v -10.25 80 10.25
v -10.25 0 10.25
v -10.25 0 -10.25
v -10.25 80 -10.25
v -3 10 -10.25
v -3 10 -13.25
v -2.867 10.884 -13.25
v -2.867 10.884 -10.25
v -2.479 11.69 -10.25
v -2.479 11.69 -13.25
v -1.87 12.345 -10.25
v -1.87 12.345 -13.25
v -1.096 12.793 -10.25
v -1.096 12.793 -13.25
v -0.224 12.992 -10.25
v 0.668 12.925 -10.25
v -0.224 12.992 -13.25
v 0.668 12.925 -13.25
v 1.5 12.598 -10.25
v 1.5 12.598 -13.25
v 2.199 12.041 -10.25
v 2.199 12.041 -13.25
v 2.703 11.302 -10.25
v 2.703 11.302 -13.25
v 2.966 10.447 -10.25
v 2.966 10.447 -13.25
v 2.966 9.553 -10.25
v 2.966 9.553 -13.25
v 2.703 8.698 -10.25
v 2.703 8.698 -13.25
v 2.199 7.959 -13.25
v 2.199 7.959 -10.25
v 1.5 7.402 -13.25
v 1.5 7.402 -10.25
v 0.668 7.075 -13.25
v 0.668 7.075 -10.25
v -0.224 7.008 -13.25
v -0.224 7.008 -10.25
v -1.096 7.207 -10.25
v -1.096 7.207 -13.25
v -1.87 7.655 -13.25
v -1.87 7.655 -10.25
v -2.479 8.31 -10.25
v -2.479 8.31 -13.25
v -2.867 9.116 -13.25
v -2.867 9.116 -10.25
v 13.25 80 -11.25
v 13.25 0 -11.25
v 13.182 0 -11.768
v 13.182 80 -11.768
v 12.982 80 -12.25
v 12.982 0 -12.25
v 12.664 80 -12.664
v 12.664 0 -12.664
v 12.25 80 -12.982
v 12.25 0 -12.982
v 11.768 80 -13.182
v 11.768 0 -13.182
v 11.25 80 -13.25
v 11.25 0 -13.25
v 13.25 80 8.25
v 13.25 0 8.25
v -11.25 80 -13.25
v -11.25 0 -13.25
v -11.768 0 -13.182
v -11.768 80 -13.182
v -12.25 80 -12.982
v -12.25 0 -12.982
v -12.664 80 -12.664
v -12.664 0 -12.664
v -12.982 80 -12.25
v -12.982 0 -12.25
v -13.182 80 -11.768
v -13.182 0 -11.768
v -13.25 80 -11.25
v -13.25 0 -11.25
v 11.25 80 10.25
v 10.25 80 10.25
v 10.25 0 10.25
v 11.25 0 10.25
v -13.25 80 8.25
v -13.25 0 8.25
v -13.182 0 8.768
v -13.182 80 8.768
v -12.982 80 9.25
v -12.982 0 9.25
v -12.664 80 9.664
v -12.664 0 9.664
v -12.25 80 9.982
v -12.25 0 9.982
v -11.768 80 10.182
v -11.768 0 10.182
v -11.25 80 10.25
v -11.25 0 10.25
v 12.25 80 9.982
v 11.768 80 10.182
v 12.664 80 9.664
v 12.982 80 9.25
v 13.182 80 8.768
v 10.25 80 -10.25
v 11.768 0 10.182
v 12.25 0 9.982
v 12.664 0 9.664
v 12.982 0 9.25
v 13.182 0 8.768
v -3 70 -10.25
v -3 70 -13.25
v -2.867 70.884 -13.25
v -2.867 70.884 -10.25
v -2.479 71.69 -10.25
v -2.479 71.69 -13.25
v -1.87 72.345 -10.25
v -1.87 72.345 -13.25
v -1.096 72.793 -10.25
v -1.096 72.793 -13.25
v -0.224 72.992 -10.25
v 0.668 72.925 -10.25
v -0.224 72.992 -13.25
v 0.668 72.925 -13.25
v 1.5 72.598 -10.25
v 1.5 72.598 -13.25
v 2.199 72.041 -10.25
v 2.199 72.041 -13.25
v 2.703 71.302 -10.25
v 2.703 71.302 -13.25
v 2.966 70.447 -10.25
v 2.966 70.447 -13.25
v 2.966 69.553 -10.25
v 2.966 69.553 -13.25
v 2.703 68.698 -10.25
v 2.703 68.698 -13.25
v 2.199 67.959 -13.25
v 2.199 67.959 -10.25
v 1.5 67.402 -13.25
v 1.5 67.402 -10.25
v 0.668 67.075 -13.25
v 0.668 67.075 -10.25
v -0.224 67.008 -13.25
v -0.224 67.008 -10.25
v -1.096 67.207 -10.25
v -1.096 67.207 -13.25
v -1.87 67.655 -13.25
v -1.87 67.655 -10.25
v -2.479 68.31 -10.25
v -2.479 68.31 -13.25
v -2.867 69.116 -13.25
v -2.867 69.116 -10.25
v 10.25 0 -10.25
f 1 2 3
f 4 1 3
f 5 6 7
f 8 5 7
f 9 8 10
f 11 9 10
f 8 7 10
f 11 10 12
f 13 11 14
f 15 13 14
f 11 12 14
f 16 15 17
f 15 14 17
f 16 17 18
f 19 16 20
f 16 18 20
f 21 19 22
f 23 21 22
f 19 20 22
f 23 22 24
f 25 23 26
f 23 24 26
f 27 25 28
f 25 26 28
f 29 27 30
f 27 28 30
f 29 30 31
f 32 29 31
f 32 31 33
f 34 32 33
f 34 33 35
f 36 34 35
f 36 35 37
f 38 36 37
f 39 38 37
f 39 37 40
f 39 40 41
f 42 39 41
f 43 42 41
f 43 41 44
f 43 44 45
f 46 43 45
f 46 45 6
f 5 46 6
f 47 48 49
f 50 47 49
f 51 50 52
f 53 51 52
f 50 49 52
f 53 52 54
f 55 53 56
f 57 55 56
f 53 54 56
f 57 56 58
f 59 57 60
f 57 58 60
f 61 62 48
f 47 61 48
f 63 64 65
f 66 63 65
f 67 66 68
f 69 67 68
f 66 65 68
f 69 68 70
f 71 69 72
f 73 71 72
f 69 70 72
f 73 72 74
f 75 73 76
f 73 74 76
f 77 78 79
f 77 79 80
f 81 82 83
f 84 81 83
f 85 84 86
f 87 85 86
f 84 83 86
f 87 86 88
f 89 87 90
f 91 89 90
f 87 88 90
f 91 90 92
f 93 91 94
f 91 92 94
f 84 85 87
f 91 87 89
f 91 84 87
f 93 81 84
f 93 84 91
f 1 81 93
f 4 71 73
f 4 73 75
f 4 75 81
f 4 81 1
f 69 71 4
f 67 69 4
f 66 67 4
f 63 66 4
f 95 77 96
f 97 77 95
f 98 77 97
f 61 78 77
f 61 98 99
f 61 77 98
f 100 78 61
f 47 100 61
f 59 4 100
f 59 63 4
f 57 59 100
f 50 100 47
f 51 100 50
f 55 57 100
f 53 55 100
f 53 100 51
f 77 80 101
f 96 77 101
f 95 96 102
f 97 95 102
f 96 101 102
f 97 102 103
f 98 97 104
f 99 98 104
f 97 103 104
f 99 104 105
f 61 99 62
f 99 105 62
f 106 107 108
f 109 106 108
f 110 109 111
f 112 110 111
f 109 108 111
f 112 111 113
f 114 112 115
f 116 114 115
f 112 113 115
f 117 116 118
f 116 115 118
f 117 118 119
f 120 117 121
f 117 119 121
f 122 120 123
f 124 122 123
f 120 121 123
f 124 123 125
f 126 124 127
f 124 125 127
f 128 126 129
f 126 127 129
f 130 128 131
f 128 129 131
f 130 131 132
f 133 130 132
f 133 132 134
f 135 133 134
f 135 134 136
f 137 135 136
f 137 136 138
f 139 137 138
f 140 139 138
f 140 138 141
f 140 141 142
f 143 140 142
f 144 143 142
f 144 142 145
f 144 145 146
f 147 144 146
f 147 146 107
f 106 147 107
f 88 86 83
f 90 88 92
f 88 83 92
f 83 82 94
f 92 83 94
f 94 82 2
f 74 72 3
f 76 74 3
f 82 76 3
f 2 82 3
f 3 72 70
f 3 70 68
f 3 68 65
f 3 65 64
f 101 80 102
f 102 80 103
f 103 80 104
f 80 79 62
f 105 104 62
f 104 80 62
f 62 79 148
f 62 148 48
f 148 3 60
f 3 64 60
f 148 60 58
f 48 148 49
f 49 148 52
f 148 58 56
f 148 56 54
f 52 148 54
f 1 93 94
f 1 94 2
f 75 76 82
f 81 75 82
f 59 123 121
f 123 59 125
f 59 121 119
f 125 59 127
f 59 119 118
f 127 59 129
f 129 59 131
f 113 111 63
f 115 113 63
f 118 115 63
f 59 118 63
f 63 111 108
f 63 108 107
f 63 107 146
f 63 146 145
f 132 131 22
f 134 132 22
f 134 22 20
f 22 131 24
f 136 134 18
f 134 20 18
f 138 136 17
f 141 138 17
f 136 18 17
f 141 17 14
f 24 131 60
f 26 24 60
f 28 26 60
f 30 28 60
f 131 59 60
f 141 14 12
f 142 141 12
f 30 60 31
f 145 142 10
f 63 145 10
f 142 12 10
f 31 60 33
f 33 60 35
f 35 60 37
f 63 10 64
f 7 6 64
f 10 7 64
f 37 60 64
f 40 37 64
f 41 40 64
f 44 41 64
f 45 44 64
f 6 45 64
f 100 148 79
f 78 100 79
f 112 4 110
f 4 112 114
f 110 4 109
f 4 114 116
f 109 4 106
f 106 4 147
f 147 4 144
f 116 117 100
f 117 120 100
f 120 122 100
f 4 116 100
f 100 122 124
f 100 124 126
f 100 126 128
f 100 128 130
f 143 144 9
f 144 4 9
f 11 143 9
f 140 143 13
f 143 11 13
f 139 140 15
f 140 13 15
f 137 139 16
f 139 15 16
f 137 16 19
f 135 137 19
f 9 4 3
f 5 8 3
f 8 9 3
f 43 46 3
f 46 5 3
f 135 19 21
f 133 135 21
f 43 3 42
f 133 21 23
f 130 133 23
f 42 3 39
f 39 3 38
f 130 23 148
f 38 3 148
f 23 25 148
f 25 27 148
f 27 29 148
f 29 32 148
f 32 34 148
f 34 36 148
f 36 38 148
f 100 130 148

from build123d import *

# Parameters (mm, degrees)
BOSS_EXTRUDE1_DEPTH = 80
SKETCH3_R           = 3
CUT_EXTRUDE1_DEPTH  = 26


with BuildPart() as part:
    # Sketch1 → Boss-Extrude1 (new body)
    with BuildSketch(Plane(origin=(0, 0, 0), x_dir=(1, 0, 0), z_dir=(0, 1, 0))):
        with BuildLine():
            Line((11.25, 13.25), (-11.25, 13.25))
            ThreePointArc((-11.25, 13.25), (-12.664213562, 12.664213562), (-13.25, 11.25))
            Line((-13.25, 11.25), (-13.25, -8.25))
            ThreePointArc((-13.25, -8.25), (-12.664213562, -9.664213562), (-11.25, -10.25))
            Line((-11.25, -10.25), (-10.25, -10.25))
            Line((-10.25, -10.25), (-10.25, 10.25))
            Line((-10.25, 10.25), (10.25, 10.25))
            Line((10.25, 10.25), (10.25, -10.25))
            Line((10.25, -10.25), (11.25, -10.25))
            ThreePointArc((11.25, -10.25), (12.664213562, -9.664213562), (13.25, -8.25))
            Line((13.25, -8.25), (13.25, 11.25))
            ThreePointArc((13.25, 11.25), (12.664213562, 12.664213562), (11.25, 13.25))
        make_face()
    extrude(amount=BOSS_EXTRUDE1_DEPTH)

    # Sketch3 → Cut-Extrude1 (cut)
    with BuildSketch(Plane(origin=(0, 0, -13.25), x_dir=(-1, 0, 0), z_dir=(0, 0, -1))):
        with Locations((0, 70)):
            Circle(SKETCH3_R)
        with Locations((0, 10)):
            Circle(SKETCH3_R)
    extrude(amount=-CUT_EXTRUDE1_DEPTH, mode=Mode.SUBTRACT)


solid = part.part
